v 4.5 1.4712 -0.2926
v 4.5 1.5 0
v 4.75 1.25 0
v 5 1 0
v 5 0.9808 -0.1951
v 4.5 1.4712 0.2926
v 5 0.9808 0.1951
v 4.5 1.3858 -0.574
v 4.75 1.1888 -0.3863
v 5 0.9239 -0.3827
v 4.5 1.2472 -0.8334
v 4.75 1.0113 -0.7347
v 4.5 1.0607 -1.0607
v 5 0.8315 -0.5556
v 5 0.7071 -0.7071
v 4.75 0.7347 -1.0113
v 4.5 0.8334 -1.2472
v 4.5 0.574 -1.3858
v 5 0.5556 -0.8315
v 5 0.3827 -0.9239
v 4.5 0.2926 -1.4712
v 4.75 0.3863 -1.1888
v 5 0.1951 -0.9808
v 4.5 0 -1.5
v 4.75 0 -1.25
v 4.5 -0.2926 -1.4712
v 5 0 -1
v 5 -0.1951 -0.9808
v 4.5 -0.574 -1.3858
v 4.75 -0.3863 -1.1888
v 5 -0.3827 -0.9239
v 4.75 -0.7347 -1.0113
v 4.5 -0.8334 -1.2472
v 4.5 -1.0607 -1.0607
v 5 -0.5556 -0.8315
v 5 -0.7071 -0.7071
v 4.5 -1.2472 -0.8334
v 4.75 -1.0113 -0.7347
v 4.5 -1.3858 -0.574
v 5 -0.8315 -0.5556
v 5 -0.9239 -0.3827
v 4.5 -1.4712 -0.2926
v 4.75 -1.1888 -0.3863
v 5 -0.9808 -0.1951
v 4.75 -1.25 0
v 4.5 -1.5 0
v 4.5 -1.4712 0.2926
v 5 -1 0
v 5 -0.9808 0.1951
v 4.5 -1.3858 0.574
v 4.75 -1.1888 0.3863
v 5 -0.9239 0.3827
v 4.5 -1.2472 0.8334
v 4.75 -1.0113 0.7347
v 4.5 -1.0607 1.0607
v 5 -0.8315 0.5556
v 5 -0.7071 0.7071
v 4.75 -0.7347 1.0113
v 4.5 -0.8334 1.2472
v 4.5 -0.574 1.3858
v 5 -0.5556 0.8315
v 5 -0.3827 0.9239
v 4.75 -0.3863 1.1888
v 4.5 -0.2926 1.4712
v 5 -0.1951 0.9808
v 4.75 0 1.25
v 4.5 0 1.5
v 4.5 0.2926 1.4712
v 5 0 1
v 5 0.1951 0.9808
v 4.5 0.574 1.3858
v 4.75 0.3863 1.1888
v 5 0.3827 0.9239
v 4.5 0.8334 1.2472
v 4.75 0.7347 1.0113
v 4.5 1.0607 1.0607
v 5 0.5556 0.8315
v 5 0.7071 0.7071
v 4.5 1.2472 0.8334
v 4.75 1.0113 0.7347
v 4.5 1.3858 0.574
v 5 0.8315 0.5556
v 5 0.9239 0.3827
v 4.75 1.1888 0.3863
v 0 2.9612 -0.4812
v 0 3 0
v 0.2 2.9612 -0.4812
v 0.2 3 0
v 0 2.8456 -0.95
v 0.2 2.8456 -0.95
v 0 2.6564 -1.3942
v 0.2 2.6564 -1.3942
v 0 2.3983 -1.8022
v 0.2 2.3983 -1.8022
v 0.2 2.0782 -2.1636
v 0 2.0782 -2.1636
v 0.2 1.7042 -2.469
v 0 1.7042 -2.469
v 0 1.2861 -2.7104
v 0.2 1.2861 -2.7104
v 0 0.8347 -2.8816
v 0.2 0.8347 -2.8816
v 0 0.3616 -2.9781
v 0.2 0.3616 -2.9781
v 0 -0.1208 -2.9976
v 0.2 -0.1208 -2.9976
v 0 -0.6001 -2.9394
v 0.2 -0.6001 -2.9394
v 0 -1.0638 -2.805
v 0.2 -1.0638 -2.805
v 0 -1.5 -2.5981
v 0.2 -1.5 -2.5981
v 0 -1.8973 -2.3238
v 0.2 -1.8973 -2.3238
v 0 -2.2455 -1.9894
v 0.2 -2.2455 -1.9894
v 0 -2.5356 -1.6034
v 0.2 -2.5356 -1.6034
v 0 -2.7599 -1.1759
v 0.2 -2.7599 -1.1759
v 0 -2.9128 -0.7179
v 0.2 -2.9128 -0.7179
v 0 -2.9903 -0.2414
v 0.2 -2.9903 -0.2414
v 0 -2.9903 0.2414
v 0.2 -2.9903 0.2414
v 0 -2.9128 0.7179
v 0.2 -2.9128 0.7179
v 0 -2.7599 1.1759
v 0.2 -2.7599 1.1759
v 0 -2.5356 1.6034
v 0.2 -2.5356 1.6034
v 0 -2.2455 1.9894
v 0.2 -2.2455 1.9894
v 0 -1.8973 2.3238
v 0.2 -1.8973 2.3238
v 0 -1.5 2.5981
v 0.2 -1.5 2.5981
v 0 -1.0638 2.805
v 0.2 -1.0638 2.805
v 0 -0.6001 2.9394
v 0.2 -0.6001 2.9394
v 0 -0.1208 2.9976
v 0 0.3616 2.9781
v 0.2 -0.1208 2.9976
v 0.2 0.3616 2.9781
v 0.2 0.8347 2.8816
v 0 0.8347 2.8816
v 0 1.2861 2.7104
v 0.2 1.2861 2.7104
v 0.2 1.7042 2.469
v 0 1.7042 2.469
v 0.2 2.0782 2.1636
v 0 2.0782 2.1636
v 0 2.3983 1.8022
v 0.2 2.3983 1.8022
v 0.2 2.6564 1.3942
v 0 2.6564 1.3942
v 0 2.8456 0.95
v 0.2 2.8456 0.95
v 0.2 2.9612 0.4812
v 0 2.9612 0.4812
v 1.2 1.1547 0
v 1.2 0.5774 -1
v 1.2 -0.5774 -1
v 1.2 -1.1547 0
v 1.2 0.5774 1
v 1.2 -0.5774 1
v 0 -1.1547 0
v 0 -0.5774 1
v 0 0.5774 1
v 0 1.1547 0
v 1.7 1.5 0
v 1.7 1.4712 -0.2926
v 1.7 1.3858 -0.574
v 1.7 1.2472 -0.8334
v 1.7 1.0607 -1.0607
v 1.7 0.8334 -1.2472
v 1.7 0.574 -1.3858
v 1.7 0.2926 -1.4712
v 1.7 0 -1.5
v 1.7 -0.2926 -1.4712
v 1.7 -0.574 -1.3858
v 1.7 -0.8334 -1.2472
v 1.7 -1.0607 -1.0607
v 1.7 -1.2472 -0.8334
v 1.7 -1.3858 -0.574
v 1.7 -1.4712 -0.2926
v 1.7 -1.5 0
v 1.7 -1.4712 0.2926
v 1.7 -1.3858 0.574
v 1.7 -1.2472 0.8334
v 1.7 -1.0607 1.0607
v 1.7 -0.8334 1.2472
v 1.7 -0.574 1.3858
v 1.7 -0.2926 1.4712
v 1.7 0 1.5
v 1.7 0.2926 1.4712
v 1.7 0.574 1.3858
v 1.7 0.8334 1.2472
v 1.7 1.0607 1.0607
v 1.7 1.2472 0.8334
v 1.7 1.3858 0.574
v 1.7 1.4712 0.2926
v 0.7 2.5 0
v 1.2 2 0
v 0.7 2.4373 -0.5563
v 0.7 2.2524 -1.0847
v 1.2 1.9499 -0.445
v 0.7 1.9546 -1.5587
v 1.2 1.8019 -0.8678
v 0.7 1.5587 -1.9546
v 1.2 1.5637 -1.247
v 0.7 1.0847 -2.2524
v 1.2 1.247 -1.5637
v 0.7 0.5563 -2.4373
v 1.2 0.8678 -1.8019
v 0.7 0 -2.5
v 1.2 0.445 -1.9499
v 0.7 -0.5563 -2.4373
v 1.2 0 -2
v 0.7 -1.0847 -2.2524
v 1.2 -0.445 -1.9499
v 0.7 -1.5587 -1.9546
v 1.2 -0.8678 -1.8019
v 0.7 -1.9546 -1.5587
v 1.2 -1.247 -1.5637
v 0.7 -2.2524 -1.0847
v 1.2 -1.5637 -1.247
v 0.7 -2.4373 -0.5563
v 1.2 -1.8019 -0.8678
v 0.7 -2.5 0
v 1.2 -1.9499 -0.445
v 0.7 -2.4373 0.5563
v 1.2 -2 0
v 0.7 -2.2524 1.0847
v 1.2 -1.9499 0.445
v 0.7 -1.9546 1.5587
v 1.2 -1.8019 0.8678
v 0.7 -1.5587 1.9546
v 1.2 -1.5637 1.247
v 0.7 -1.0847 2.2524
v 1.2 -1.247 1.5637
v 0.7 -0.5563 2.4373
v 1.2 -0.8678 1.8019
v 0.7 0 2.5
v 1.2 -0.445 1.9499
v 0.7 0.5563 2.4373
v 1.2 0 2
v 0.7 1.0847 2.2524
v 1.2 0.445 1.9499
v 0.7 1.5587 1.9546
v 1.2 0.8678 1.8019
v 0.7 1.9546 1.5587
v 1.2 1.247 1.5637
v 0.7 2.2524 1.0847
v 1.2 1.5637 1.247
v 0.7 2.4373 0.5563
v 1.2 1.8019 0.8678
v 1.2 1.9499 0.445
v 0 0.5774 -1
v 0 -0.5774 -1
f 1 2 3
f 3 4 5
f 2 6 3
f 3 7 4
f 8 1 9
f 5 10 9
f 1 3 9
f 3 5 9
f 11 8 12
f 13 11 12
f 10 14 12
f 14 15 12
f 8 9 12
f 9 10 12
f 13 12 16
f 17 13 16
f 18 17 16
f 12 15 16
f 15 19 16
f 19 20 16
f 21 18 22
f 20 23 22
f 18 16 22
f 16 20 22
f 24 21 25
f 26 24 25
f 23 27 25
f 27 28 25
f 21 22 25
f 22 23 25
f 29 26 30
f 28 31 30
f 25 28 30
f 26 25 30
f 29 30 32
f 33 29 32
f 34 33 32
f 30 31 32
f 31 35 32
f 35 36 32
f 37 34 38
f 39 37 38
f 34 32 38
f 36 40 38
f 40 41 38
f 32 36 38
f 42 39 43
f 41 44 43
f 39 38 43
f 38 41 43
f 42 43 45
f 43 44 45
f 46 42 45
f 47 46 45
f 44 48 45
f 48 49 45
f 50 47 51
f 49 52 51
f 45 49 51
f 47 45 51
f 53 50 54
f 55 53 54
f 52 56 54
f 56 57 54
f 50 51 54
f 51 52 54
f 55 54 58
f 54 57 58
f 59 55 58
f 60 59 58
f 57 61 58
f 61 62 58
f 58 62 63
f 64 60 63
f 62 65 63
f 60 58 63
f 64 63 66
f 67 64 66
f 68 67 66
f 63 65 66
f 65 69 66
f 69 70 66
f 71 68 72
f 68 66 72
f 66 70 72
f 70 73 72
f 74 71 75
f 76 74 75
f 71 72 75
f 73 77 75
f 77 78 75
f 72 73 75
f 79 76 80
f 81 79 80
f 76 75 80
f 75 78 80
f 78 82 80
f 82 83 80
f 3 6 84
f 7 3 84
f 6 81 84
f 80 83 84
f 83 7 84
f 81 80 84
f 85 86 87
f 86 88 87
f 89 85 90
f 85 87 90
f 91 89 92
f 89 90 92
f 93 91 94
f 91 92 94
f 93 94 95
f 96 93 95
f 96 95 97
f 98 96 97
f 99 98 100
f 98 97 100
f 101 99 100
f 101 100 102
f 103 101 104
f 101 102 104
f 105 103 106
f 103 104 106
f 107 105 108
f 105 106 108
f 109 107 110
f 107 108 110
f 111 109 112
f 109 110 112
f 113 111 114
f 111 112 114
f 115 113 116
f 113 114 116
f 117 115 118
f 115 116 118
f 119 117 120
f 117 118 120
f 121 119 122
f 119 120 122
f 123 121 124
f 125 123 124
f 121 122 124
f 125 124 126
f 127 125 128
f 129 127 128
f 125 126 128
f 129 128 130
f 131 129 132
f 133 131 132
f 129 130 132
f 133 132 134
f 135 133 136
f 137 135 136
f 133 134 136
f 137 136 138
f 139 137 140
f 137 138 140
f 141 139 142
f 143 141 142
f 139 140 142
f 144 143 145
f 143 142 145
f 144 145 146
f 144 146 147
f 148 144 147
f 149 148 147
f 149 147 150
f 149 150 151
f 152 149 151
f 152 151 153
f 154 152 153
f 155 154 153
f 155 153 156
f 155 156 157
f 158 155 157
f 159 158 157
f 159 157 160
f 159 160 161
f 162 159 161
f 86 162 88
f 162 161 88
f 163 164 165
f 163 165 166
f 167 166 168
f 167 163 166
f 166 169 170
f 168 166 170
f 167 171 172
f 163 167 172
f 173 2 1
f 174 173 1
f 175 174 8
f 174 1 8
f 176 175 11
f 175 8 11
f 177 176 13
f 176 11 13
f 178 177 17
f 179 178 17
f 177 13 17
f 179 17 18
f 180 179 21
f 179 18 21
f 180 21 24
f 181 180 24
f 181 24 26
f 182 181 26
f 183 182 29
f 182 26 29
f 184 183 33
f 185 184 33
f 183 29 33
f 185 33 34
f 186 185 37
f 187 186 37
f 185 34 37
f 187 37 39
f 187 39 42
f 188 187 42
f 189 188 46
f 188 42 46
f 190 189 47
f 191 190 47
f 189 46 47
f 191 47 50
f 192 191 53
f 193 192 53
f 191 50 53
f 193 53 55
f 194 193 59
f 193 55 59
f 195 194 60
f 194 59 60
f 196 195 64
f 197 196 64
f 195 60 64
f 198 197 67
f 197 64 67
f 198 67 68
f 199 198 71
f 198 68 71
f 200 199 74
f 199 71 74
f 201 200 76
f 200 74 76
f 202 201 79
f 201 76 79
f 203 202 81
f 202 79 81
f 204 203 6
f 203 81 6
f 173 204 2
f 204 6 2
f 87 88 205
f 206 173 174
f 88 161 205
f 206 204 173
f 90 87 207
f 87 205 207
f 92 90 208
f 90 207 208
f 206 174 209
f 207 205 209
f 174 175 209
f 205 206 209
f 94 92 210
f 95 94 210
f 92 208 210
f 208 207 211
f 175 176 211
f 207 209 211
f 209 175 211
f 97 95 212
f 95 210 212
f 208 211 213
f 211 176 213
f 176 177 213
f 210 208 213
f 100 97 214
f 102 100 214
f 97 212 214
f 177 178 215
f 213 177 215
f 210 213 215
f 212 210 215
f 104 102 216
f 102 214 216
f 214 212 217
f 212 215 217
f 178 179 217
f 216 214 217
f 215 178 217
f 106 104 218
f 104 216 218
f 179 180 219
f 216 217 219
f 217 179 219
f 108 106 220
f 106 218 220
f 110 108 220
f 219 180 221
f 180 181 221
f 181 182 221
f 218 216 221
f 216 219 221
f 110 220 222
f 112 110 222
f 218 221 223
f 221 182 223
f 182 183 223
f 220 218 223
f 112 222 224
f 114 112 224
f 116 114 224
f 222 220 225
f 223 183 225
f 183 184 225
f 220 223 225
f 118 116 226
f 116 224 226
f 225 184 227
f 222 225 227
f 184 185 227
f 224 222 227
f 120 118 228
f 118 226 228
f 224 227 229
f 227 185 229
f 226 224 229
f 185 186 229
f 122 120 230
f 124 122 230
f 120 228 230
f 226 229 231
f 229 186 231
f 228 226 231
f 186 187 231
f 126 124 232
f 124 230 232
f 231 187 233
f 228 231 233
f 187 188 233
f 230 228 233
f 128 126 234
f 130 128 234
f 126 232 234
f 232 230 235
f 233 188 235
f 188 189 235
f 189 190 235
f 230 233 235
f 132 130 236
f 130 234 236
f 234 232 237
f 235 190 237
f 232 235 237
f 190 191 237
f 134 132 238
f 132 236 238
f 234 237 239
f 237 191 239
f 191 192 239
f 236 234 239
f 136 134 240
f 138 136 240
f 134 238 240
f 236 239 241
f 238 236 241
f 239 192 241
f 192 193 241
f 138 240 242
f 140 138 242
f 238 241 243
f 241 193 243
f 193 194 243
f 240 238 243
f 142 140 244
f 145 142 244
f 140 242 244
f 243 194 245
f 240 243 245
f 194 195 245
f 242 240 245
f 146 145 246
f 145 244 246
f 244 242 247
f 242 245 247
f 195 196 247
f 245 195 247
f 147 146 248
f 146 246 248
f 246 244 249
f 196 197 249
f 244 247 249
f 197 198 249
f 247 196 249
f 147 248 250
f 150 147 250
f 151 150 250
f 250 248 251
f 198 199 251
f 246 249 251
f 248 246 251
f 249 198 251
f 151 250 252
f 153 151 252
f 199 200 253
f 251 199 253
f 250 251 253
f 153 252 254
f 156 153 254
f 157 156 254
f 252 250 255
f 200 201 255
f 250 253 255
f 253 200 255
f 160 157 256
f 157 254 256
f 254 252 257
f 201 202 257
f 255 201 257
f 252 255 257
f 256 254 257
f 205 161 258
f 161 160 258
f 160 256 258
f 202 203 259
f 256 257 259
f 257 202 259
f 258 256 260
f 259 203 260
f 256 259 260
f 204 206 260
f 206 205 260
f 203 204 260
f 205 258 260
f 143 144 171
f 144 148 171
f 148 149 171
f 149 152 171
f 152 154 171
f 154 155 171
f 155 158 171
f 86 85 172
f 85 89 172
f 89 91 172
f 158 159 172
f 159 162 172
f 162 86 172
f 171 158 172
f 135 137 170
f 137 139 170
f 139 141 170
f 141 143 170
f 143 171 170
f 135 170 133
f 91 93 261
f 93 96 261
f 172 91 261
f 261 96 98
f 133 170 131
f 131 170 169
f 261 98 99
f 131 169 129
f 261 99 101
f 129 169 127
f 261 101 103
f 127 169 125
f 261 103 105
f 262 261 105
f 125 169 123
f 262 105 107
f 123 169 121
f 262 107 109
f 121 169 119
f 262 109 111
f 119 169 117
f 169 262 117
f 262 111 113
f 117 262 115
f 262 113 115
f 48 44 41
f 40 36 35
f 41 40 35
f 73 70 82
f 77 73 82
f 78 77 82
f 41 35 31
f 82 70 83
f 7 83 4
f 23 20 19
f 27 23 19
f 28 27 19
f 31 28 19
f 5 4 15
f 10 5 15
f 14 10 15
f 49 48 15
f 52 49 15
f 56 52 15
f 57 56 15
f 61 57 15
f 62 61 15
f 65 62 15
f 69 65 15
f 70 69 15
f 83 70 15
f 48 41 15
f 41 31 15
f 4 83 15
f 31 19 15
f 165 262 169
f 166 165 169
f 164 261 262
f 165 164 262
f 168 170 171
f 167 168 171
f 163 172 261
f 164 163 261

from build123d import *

# Parameters (mm, degrees)
CHANFREIN1_SIZE         = 0.5
ENL_V_MAT_EXTRU_1_DEPTH = 1.2


with BuildPart() as part:
    # Esquisse1 → Révolution1 (revolve)
    with BuildSketch(Plane.XY):
        Polygon((0, 0), (0, 3), (0.2, 3), (1.7, 1.5), (5, 1.5), (5, 0), align=None)
    revolve(axis=Axis((5, 0, 0), (-1, 0, 0)))

    # Chanfrein1
    chanfrein1_edges = [part.edges().sort_by_distance(p)[0] for p in [
        (5, -1.5, 0),
    ]]
    chamfer(chanfrein1_edges, length=CHANFREIN1_SIZE)

    # Esquisse2 → Enlèv. mat.-Extru.1 (cut)
    with BuildSketch(Plane.ZY):
        Polygon((0, 1.154700538), (-1, 0.577350269), (-1, -0.577350269), (0, -1.154700538), (1, -0.577350269), (1, 0.577350269), align=None)
    extrude(amount=-ENL_V_MAT_EXTRU_1_DEPTH, mode=Mode.SUBTRACT)


solid = part.part
